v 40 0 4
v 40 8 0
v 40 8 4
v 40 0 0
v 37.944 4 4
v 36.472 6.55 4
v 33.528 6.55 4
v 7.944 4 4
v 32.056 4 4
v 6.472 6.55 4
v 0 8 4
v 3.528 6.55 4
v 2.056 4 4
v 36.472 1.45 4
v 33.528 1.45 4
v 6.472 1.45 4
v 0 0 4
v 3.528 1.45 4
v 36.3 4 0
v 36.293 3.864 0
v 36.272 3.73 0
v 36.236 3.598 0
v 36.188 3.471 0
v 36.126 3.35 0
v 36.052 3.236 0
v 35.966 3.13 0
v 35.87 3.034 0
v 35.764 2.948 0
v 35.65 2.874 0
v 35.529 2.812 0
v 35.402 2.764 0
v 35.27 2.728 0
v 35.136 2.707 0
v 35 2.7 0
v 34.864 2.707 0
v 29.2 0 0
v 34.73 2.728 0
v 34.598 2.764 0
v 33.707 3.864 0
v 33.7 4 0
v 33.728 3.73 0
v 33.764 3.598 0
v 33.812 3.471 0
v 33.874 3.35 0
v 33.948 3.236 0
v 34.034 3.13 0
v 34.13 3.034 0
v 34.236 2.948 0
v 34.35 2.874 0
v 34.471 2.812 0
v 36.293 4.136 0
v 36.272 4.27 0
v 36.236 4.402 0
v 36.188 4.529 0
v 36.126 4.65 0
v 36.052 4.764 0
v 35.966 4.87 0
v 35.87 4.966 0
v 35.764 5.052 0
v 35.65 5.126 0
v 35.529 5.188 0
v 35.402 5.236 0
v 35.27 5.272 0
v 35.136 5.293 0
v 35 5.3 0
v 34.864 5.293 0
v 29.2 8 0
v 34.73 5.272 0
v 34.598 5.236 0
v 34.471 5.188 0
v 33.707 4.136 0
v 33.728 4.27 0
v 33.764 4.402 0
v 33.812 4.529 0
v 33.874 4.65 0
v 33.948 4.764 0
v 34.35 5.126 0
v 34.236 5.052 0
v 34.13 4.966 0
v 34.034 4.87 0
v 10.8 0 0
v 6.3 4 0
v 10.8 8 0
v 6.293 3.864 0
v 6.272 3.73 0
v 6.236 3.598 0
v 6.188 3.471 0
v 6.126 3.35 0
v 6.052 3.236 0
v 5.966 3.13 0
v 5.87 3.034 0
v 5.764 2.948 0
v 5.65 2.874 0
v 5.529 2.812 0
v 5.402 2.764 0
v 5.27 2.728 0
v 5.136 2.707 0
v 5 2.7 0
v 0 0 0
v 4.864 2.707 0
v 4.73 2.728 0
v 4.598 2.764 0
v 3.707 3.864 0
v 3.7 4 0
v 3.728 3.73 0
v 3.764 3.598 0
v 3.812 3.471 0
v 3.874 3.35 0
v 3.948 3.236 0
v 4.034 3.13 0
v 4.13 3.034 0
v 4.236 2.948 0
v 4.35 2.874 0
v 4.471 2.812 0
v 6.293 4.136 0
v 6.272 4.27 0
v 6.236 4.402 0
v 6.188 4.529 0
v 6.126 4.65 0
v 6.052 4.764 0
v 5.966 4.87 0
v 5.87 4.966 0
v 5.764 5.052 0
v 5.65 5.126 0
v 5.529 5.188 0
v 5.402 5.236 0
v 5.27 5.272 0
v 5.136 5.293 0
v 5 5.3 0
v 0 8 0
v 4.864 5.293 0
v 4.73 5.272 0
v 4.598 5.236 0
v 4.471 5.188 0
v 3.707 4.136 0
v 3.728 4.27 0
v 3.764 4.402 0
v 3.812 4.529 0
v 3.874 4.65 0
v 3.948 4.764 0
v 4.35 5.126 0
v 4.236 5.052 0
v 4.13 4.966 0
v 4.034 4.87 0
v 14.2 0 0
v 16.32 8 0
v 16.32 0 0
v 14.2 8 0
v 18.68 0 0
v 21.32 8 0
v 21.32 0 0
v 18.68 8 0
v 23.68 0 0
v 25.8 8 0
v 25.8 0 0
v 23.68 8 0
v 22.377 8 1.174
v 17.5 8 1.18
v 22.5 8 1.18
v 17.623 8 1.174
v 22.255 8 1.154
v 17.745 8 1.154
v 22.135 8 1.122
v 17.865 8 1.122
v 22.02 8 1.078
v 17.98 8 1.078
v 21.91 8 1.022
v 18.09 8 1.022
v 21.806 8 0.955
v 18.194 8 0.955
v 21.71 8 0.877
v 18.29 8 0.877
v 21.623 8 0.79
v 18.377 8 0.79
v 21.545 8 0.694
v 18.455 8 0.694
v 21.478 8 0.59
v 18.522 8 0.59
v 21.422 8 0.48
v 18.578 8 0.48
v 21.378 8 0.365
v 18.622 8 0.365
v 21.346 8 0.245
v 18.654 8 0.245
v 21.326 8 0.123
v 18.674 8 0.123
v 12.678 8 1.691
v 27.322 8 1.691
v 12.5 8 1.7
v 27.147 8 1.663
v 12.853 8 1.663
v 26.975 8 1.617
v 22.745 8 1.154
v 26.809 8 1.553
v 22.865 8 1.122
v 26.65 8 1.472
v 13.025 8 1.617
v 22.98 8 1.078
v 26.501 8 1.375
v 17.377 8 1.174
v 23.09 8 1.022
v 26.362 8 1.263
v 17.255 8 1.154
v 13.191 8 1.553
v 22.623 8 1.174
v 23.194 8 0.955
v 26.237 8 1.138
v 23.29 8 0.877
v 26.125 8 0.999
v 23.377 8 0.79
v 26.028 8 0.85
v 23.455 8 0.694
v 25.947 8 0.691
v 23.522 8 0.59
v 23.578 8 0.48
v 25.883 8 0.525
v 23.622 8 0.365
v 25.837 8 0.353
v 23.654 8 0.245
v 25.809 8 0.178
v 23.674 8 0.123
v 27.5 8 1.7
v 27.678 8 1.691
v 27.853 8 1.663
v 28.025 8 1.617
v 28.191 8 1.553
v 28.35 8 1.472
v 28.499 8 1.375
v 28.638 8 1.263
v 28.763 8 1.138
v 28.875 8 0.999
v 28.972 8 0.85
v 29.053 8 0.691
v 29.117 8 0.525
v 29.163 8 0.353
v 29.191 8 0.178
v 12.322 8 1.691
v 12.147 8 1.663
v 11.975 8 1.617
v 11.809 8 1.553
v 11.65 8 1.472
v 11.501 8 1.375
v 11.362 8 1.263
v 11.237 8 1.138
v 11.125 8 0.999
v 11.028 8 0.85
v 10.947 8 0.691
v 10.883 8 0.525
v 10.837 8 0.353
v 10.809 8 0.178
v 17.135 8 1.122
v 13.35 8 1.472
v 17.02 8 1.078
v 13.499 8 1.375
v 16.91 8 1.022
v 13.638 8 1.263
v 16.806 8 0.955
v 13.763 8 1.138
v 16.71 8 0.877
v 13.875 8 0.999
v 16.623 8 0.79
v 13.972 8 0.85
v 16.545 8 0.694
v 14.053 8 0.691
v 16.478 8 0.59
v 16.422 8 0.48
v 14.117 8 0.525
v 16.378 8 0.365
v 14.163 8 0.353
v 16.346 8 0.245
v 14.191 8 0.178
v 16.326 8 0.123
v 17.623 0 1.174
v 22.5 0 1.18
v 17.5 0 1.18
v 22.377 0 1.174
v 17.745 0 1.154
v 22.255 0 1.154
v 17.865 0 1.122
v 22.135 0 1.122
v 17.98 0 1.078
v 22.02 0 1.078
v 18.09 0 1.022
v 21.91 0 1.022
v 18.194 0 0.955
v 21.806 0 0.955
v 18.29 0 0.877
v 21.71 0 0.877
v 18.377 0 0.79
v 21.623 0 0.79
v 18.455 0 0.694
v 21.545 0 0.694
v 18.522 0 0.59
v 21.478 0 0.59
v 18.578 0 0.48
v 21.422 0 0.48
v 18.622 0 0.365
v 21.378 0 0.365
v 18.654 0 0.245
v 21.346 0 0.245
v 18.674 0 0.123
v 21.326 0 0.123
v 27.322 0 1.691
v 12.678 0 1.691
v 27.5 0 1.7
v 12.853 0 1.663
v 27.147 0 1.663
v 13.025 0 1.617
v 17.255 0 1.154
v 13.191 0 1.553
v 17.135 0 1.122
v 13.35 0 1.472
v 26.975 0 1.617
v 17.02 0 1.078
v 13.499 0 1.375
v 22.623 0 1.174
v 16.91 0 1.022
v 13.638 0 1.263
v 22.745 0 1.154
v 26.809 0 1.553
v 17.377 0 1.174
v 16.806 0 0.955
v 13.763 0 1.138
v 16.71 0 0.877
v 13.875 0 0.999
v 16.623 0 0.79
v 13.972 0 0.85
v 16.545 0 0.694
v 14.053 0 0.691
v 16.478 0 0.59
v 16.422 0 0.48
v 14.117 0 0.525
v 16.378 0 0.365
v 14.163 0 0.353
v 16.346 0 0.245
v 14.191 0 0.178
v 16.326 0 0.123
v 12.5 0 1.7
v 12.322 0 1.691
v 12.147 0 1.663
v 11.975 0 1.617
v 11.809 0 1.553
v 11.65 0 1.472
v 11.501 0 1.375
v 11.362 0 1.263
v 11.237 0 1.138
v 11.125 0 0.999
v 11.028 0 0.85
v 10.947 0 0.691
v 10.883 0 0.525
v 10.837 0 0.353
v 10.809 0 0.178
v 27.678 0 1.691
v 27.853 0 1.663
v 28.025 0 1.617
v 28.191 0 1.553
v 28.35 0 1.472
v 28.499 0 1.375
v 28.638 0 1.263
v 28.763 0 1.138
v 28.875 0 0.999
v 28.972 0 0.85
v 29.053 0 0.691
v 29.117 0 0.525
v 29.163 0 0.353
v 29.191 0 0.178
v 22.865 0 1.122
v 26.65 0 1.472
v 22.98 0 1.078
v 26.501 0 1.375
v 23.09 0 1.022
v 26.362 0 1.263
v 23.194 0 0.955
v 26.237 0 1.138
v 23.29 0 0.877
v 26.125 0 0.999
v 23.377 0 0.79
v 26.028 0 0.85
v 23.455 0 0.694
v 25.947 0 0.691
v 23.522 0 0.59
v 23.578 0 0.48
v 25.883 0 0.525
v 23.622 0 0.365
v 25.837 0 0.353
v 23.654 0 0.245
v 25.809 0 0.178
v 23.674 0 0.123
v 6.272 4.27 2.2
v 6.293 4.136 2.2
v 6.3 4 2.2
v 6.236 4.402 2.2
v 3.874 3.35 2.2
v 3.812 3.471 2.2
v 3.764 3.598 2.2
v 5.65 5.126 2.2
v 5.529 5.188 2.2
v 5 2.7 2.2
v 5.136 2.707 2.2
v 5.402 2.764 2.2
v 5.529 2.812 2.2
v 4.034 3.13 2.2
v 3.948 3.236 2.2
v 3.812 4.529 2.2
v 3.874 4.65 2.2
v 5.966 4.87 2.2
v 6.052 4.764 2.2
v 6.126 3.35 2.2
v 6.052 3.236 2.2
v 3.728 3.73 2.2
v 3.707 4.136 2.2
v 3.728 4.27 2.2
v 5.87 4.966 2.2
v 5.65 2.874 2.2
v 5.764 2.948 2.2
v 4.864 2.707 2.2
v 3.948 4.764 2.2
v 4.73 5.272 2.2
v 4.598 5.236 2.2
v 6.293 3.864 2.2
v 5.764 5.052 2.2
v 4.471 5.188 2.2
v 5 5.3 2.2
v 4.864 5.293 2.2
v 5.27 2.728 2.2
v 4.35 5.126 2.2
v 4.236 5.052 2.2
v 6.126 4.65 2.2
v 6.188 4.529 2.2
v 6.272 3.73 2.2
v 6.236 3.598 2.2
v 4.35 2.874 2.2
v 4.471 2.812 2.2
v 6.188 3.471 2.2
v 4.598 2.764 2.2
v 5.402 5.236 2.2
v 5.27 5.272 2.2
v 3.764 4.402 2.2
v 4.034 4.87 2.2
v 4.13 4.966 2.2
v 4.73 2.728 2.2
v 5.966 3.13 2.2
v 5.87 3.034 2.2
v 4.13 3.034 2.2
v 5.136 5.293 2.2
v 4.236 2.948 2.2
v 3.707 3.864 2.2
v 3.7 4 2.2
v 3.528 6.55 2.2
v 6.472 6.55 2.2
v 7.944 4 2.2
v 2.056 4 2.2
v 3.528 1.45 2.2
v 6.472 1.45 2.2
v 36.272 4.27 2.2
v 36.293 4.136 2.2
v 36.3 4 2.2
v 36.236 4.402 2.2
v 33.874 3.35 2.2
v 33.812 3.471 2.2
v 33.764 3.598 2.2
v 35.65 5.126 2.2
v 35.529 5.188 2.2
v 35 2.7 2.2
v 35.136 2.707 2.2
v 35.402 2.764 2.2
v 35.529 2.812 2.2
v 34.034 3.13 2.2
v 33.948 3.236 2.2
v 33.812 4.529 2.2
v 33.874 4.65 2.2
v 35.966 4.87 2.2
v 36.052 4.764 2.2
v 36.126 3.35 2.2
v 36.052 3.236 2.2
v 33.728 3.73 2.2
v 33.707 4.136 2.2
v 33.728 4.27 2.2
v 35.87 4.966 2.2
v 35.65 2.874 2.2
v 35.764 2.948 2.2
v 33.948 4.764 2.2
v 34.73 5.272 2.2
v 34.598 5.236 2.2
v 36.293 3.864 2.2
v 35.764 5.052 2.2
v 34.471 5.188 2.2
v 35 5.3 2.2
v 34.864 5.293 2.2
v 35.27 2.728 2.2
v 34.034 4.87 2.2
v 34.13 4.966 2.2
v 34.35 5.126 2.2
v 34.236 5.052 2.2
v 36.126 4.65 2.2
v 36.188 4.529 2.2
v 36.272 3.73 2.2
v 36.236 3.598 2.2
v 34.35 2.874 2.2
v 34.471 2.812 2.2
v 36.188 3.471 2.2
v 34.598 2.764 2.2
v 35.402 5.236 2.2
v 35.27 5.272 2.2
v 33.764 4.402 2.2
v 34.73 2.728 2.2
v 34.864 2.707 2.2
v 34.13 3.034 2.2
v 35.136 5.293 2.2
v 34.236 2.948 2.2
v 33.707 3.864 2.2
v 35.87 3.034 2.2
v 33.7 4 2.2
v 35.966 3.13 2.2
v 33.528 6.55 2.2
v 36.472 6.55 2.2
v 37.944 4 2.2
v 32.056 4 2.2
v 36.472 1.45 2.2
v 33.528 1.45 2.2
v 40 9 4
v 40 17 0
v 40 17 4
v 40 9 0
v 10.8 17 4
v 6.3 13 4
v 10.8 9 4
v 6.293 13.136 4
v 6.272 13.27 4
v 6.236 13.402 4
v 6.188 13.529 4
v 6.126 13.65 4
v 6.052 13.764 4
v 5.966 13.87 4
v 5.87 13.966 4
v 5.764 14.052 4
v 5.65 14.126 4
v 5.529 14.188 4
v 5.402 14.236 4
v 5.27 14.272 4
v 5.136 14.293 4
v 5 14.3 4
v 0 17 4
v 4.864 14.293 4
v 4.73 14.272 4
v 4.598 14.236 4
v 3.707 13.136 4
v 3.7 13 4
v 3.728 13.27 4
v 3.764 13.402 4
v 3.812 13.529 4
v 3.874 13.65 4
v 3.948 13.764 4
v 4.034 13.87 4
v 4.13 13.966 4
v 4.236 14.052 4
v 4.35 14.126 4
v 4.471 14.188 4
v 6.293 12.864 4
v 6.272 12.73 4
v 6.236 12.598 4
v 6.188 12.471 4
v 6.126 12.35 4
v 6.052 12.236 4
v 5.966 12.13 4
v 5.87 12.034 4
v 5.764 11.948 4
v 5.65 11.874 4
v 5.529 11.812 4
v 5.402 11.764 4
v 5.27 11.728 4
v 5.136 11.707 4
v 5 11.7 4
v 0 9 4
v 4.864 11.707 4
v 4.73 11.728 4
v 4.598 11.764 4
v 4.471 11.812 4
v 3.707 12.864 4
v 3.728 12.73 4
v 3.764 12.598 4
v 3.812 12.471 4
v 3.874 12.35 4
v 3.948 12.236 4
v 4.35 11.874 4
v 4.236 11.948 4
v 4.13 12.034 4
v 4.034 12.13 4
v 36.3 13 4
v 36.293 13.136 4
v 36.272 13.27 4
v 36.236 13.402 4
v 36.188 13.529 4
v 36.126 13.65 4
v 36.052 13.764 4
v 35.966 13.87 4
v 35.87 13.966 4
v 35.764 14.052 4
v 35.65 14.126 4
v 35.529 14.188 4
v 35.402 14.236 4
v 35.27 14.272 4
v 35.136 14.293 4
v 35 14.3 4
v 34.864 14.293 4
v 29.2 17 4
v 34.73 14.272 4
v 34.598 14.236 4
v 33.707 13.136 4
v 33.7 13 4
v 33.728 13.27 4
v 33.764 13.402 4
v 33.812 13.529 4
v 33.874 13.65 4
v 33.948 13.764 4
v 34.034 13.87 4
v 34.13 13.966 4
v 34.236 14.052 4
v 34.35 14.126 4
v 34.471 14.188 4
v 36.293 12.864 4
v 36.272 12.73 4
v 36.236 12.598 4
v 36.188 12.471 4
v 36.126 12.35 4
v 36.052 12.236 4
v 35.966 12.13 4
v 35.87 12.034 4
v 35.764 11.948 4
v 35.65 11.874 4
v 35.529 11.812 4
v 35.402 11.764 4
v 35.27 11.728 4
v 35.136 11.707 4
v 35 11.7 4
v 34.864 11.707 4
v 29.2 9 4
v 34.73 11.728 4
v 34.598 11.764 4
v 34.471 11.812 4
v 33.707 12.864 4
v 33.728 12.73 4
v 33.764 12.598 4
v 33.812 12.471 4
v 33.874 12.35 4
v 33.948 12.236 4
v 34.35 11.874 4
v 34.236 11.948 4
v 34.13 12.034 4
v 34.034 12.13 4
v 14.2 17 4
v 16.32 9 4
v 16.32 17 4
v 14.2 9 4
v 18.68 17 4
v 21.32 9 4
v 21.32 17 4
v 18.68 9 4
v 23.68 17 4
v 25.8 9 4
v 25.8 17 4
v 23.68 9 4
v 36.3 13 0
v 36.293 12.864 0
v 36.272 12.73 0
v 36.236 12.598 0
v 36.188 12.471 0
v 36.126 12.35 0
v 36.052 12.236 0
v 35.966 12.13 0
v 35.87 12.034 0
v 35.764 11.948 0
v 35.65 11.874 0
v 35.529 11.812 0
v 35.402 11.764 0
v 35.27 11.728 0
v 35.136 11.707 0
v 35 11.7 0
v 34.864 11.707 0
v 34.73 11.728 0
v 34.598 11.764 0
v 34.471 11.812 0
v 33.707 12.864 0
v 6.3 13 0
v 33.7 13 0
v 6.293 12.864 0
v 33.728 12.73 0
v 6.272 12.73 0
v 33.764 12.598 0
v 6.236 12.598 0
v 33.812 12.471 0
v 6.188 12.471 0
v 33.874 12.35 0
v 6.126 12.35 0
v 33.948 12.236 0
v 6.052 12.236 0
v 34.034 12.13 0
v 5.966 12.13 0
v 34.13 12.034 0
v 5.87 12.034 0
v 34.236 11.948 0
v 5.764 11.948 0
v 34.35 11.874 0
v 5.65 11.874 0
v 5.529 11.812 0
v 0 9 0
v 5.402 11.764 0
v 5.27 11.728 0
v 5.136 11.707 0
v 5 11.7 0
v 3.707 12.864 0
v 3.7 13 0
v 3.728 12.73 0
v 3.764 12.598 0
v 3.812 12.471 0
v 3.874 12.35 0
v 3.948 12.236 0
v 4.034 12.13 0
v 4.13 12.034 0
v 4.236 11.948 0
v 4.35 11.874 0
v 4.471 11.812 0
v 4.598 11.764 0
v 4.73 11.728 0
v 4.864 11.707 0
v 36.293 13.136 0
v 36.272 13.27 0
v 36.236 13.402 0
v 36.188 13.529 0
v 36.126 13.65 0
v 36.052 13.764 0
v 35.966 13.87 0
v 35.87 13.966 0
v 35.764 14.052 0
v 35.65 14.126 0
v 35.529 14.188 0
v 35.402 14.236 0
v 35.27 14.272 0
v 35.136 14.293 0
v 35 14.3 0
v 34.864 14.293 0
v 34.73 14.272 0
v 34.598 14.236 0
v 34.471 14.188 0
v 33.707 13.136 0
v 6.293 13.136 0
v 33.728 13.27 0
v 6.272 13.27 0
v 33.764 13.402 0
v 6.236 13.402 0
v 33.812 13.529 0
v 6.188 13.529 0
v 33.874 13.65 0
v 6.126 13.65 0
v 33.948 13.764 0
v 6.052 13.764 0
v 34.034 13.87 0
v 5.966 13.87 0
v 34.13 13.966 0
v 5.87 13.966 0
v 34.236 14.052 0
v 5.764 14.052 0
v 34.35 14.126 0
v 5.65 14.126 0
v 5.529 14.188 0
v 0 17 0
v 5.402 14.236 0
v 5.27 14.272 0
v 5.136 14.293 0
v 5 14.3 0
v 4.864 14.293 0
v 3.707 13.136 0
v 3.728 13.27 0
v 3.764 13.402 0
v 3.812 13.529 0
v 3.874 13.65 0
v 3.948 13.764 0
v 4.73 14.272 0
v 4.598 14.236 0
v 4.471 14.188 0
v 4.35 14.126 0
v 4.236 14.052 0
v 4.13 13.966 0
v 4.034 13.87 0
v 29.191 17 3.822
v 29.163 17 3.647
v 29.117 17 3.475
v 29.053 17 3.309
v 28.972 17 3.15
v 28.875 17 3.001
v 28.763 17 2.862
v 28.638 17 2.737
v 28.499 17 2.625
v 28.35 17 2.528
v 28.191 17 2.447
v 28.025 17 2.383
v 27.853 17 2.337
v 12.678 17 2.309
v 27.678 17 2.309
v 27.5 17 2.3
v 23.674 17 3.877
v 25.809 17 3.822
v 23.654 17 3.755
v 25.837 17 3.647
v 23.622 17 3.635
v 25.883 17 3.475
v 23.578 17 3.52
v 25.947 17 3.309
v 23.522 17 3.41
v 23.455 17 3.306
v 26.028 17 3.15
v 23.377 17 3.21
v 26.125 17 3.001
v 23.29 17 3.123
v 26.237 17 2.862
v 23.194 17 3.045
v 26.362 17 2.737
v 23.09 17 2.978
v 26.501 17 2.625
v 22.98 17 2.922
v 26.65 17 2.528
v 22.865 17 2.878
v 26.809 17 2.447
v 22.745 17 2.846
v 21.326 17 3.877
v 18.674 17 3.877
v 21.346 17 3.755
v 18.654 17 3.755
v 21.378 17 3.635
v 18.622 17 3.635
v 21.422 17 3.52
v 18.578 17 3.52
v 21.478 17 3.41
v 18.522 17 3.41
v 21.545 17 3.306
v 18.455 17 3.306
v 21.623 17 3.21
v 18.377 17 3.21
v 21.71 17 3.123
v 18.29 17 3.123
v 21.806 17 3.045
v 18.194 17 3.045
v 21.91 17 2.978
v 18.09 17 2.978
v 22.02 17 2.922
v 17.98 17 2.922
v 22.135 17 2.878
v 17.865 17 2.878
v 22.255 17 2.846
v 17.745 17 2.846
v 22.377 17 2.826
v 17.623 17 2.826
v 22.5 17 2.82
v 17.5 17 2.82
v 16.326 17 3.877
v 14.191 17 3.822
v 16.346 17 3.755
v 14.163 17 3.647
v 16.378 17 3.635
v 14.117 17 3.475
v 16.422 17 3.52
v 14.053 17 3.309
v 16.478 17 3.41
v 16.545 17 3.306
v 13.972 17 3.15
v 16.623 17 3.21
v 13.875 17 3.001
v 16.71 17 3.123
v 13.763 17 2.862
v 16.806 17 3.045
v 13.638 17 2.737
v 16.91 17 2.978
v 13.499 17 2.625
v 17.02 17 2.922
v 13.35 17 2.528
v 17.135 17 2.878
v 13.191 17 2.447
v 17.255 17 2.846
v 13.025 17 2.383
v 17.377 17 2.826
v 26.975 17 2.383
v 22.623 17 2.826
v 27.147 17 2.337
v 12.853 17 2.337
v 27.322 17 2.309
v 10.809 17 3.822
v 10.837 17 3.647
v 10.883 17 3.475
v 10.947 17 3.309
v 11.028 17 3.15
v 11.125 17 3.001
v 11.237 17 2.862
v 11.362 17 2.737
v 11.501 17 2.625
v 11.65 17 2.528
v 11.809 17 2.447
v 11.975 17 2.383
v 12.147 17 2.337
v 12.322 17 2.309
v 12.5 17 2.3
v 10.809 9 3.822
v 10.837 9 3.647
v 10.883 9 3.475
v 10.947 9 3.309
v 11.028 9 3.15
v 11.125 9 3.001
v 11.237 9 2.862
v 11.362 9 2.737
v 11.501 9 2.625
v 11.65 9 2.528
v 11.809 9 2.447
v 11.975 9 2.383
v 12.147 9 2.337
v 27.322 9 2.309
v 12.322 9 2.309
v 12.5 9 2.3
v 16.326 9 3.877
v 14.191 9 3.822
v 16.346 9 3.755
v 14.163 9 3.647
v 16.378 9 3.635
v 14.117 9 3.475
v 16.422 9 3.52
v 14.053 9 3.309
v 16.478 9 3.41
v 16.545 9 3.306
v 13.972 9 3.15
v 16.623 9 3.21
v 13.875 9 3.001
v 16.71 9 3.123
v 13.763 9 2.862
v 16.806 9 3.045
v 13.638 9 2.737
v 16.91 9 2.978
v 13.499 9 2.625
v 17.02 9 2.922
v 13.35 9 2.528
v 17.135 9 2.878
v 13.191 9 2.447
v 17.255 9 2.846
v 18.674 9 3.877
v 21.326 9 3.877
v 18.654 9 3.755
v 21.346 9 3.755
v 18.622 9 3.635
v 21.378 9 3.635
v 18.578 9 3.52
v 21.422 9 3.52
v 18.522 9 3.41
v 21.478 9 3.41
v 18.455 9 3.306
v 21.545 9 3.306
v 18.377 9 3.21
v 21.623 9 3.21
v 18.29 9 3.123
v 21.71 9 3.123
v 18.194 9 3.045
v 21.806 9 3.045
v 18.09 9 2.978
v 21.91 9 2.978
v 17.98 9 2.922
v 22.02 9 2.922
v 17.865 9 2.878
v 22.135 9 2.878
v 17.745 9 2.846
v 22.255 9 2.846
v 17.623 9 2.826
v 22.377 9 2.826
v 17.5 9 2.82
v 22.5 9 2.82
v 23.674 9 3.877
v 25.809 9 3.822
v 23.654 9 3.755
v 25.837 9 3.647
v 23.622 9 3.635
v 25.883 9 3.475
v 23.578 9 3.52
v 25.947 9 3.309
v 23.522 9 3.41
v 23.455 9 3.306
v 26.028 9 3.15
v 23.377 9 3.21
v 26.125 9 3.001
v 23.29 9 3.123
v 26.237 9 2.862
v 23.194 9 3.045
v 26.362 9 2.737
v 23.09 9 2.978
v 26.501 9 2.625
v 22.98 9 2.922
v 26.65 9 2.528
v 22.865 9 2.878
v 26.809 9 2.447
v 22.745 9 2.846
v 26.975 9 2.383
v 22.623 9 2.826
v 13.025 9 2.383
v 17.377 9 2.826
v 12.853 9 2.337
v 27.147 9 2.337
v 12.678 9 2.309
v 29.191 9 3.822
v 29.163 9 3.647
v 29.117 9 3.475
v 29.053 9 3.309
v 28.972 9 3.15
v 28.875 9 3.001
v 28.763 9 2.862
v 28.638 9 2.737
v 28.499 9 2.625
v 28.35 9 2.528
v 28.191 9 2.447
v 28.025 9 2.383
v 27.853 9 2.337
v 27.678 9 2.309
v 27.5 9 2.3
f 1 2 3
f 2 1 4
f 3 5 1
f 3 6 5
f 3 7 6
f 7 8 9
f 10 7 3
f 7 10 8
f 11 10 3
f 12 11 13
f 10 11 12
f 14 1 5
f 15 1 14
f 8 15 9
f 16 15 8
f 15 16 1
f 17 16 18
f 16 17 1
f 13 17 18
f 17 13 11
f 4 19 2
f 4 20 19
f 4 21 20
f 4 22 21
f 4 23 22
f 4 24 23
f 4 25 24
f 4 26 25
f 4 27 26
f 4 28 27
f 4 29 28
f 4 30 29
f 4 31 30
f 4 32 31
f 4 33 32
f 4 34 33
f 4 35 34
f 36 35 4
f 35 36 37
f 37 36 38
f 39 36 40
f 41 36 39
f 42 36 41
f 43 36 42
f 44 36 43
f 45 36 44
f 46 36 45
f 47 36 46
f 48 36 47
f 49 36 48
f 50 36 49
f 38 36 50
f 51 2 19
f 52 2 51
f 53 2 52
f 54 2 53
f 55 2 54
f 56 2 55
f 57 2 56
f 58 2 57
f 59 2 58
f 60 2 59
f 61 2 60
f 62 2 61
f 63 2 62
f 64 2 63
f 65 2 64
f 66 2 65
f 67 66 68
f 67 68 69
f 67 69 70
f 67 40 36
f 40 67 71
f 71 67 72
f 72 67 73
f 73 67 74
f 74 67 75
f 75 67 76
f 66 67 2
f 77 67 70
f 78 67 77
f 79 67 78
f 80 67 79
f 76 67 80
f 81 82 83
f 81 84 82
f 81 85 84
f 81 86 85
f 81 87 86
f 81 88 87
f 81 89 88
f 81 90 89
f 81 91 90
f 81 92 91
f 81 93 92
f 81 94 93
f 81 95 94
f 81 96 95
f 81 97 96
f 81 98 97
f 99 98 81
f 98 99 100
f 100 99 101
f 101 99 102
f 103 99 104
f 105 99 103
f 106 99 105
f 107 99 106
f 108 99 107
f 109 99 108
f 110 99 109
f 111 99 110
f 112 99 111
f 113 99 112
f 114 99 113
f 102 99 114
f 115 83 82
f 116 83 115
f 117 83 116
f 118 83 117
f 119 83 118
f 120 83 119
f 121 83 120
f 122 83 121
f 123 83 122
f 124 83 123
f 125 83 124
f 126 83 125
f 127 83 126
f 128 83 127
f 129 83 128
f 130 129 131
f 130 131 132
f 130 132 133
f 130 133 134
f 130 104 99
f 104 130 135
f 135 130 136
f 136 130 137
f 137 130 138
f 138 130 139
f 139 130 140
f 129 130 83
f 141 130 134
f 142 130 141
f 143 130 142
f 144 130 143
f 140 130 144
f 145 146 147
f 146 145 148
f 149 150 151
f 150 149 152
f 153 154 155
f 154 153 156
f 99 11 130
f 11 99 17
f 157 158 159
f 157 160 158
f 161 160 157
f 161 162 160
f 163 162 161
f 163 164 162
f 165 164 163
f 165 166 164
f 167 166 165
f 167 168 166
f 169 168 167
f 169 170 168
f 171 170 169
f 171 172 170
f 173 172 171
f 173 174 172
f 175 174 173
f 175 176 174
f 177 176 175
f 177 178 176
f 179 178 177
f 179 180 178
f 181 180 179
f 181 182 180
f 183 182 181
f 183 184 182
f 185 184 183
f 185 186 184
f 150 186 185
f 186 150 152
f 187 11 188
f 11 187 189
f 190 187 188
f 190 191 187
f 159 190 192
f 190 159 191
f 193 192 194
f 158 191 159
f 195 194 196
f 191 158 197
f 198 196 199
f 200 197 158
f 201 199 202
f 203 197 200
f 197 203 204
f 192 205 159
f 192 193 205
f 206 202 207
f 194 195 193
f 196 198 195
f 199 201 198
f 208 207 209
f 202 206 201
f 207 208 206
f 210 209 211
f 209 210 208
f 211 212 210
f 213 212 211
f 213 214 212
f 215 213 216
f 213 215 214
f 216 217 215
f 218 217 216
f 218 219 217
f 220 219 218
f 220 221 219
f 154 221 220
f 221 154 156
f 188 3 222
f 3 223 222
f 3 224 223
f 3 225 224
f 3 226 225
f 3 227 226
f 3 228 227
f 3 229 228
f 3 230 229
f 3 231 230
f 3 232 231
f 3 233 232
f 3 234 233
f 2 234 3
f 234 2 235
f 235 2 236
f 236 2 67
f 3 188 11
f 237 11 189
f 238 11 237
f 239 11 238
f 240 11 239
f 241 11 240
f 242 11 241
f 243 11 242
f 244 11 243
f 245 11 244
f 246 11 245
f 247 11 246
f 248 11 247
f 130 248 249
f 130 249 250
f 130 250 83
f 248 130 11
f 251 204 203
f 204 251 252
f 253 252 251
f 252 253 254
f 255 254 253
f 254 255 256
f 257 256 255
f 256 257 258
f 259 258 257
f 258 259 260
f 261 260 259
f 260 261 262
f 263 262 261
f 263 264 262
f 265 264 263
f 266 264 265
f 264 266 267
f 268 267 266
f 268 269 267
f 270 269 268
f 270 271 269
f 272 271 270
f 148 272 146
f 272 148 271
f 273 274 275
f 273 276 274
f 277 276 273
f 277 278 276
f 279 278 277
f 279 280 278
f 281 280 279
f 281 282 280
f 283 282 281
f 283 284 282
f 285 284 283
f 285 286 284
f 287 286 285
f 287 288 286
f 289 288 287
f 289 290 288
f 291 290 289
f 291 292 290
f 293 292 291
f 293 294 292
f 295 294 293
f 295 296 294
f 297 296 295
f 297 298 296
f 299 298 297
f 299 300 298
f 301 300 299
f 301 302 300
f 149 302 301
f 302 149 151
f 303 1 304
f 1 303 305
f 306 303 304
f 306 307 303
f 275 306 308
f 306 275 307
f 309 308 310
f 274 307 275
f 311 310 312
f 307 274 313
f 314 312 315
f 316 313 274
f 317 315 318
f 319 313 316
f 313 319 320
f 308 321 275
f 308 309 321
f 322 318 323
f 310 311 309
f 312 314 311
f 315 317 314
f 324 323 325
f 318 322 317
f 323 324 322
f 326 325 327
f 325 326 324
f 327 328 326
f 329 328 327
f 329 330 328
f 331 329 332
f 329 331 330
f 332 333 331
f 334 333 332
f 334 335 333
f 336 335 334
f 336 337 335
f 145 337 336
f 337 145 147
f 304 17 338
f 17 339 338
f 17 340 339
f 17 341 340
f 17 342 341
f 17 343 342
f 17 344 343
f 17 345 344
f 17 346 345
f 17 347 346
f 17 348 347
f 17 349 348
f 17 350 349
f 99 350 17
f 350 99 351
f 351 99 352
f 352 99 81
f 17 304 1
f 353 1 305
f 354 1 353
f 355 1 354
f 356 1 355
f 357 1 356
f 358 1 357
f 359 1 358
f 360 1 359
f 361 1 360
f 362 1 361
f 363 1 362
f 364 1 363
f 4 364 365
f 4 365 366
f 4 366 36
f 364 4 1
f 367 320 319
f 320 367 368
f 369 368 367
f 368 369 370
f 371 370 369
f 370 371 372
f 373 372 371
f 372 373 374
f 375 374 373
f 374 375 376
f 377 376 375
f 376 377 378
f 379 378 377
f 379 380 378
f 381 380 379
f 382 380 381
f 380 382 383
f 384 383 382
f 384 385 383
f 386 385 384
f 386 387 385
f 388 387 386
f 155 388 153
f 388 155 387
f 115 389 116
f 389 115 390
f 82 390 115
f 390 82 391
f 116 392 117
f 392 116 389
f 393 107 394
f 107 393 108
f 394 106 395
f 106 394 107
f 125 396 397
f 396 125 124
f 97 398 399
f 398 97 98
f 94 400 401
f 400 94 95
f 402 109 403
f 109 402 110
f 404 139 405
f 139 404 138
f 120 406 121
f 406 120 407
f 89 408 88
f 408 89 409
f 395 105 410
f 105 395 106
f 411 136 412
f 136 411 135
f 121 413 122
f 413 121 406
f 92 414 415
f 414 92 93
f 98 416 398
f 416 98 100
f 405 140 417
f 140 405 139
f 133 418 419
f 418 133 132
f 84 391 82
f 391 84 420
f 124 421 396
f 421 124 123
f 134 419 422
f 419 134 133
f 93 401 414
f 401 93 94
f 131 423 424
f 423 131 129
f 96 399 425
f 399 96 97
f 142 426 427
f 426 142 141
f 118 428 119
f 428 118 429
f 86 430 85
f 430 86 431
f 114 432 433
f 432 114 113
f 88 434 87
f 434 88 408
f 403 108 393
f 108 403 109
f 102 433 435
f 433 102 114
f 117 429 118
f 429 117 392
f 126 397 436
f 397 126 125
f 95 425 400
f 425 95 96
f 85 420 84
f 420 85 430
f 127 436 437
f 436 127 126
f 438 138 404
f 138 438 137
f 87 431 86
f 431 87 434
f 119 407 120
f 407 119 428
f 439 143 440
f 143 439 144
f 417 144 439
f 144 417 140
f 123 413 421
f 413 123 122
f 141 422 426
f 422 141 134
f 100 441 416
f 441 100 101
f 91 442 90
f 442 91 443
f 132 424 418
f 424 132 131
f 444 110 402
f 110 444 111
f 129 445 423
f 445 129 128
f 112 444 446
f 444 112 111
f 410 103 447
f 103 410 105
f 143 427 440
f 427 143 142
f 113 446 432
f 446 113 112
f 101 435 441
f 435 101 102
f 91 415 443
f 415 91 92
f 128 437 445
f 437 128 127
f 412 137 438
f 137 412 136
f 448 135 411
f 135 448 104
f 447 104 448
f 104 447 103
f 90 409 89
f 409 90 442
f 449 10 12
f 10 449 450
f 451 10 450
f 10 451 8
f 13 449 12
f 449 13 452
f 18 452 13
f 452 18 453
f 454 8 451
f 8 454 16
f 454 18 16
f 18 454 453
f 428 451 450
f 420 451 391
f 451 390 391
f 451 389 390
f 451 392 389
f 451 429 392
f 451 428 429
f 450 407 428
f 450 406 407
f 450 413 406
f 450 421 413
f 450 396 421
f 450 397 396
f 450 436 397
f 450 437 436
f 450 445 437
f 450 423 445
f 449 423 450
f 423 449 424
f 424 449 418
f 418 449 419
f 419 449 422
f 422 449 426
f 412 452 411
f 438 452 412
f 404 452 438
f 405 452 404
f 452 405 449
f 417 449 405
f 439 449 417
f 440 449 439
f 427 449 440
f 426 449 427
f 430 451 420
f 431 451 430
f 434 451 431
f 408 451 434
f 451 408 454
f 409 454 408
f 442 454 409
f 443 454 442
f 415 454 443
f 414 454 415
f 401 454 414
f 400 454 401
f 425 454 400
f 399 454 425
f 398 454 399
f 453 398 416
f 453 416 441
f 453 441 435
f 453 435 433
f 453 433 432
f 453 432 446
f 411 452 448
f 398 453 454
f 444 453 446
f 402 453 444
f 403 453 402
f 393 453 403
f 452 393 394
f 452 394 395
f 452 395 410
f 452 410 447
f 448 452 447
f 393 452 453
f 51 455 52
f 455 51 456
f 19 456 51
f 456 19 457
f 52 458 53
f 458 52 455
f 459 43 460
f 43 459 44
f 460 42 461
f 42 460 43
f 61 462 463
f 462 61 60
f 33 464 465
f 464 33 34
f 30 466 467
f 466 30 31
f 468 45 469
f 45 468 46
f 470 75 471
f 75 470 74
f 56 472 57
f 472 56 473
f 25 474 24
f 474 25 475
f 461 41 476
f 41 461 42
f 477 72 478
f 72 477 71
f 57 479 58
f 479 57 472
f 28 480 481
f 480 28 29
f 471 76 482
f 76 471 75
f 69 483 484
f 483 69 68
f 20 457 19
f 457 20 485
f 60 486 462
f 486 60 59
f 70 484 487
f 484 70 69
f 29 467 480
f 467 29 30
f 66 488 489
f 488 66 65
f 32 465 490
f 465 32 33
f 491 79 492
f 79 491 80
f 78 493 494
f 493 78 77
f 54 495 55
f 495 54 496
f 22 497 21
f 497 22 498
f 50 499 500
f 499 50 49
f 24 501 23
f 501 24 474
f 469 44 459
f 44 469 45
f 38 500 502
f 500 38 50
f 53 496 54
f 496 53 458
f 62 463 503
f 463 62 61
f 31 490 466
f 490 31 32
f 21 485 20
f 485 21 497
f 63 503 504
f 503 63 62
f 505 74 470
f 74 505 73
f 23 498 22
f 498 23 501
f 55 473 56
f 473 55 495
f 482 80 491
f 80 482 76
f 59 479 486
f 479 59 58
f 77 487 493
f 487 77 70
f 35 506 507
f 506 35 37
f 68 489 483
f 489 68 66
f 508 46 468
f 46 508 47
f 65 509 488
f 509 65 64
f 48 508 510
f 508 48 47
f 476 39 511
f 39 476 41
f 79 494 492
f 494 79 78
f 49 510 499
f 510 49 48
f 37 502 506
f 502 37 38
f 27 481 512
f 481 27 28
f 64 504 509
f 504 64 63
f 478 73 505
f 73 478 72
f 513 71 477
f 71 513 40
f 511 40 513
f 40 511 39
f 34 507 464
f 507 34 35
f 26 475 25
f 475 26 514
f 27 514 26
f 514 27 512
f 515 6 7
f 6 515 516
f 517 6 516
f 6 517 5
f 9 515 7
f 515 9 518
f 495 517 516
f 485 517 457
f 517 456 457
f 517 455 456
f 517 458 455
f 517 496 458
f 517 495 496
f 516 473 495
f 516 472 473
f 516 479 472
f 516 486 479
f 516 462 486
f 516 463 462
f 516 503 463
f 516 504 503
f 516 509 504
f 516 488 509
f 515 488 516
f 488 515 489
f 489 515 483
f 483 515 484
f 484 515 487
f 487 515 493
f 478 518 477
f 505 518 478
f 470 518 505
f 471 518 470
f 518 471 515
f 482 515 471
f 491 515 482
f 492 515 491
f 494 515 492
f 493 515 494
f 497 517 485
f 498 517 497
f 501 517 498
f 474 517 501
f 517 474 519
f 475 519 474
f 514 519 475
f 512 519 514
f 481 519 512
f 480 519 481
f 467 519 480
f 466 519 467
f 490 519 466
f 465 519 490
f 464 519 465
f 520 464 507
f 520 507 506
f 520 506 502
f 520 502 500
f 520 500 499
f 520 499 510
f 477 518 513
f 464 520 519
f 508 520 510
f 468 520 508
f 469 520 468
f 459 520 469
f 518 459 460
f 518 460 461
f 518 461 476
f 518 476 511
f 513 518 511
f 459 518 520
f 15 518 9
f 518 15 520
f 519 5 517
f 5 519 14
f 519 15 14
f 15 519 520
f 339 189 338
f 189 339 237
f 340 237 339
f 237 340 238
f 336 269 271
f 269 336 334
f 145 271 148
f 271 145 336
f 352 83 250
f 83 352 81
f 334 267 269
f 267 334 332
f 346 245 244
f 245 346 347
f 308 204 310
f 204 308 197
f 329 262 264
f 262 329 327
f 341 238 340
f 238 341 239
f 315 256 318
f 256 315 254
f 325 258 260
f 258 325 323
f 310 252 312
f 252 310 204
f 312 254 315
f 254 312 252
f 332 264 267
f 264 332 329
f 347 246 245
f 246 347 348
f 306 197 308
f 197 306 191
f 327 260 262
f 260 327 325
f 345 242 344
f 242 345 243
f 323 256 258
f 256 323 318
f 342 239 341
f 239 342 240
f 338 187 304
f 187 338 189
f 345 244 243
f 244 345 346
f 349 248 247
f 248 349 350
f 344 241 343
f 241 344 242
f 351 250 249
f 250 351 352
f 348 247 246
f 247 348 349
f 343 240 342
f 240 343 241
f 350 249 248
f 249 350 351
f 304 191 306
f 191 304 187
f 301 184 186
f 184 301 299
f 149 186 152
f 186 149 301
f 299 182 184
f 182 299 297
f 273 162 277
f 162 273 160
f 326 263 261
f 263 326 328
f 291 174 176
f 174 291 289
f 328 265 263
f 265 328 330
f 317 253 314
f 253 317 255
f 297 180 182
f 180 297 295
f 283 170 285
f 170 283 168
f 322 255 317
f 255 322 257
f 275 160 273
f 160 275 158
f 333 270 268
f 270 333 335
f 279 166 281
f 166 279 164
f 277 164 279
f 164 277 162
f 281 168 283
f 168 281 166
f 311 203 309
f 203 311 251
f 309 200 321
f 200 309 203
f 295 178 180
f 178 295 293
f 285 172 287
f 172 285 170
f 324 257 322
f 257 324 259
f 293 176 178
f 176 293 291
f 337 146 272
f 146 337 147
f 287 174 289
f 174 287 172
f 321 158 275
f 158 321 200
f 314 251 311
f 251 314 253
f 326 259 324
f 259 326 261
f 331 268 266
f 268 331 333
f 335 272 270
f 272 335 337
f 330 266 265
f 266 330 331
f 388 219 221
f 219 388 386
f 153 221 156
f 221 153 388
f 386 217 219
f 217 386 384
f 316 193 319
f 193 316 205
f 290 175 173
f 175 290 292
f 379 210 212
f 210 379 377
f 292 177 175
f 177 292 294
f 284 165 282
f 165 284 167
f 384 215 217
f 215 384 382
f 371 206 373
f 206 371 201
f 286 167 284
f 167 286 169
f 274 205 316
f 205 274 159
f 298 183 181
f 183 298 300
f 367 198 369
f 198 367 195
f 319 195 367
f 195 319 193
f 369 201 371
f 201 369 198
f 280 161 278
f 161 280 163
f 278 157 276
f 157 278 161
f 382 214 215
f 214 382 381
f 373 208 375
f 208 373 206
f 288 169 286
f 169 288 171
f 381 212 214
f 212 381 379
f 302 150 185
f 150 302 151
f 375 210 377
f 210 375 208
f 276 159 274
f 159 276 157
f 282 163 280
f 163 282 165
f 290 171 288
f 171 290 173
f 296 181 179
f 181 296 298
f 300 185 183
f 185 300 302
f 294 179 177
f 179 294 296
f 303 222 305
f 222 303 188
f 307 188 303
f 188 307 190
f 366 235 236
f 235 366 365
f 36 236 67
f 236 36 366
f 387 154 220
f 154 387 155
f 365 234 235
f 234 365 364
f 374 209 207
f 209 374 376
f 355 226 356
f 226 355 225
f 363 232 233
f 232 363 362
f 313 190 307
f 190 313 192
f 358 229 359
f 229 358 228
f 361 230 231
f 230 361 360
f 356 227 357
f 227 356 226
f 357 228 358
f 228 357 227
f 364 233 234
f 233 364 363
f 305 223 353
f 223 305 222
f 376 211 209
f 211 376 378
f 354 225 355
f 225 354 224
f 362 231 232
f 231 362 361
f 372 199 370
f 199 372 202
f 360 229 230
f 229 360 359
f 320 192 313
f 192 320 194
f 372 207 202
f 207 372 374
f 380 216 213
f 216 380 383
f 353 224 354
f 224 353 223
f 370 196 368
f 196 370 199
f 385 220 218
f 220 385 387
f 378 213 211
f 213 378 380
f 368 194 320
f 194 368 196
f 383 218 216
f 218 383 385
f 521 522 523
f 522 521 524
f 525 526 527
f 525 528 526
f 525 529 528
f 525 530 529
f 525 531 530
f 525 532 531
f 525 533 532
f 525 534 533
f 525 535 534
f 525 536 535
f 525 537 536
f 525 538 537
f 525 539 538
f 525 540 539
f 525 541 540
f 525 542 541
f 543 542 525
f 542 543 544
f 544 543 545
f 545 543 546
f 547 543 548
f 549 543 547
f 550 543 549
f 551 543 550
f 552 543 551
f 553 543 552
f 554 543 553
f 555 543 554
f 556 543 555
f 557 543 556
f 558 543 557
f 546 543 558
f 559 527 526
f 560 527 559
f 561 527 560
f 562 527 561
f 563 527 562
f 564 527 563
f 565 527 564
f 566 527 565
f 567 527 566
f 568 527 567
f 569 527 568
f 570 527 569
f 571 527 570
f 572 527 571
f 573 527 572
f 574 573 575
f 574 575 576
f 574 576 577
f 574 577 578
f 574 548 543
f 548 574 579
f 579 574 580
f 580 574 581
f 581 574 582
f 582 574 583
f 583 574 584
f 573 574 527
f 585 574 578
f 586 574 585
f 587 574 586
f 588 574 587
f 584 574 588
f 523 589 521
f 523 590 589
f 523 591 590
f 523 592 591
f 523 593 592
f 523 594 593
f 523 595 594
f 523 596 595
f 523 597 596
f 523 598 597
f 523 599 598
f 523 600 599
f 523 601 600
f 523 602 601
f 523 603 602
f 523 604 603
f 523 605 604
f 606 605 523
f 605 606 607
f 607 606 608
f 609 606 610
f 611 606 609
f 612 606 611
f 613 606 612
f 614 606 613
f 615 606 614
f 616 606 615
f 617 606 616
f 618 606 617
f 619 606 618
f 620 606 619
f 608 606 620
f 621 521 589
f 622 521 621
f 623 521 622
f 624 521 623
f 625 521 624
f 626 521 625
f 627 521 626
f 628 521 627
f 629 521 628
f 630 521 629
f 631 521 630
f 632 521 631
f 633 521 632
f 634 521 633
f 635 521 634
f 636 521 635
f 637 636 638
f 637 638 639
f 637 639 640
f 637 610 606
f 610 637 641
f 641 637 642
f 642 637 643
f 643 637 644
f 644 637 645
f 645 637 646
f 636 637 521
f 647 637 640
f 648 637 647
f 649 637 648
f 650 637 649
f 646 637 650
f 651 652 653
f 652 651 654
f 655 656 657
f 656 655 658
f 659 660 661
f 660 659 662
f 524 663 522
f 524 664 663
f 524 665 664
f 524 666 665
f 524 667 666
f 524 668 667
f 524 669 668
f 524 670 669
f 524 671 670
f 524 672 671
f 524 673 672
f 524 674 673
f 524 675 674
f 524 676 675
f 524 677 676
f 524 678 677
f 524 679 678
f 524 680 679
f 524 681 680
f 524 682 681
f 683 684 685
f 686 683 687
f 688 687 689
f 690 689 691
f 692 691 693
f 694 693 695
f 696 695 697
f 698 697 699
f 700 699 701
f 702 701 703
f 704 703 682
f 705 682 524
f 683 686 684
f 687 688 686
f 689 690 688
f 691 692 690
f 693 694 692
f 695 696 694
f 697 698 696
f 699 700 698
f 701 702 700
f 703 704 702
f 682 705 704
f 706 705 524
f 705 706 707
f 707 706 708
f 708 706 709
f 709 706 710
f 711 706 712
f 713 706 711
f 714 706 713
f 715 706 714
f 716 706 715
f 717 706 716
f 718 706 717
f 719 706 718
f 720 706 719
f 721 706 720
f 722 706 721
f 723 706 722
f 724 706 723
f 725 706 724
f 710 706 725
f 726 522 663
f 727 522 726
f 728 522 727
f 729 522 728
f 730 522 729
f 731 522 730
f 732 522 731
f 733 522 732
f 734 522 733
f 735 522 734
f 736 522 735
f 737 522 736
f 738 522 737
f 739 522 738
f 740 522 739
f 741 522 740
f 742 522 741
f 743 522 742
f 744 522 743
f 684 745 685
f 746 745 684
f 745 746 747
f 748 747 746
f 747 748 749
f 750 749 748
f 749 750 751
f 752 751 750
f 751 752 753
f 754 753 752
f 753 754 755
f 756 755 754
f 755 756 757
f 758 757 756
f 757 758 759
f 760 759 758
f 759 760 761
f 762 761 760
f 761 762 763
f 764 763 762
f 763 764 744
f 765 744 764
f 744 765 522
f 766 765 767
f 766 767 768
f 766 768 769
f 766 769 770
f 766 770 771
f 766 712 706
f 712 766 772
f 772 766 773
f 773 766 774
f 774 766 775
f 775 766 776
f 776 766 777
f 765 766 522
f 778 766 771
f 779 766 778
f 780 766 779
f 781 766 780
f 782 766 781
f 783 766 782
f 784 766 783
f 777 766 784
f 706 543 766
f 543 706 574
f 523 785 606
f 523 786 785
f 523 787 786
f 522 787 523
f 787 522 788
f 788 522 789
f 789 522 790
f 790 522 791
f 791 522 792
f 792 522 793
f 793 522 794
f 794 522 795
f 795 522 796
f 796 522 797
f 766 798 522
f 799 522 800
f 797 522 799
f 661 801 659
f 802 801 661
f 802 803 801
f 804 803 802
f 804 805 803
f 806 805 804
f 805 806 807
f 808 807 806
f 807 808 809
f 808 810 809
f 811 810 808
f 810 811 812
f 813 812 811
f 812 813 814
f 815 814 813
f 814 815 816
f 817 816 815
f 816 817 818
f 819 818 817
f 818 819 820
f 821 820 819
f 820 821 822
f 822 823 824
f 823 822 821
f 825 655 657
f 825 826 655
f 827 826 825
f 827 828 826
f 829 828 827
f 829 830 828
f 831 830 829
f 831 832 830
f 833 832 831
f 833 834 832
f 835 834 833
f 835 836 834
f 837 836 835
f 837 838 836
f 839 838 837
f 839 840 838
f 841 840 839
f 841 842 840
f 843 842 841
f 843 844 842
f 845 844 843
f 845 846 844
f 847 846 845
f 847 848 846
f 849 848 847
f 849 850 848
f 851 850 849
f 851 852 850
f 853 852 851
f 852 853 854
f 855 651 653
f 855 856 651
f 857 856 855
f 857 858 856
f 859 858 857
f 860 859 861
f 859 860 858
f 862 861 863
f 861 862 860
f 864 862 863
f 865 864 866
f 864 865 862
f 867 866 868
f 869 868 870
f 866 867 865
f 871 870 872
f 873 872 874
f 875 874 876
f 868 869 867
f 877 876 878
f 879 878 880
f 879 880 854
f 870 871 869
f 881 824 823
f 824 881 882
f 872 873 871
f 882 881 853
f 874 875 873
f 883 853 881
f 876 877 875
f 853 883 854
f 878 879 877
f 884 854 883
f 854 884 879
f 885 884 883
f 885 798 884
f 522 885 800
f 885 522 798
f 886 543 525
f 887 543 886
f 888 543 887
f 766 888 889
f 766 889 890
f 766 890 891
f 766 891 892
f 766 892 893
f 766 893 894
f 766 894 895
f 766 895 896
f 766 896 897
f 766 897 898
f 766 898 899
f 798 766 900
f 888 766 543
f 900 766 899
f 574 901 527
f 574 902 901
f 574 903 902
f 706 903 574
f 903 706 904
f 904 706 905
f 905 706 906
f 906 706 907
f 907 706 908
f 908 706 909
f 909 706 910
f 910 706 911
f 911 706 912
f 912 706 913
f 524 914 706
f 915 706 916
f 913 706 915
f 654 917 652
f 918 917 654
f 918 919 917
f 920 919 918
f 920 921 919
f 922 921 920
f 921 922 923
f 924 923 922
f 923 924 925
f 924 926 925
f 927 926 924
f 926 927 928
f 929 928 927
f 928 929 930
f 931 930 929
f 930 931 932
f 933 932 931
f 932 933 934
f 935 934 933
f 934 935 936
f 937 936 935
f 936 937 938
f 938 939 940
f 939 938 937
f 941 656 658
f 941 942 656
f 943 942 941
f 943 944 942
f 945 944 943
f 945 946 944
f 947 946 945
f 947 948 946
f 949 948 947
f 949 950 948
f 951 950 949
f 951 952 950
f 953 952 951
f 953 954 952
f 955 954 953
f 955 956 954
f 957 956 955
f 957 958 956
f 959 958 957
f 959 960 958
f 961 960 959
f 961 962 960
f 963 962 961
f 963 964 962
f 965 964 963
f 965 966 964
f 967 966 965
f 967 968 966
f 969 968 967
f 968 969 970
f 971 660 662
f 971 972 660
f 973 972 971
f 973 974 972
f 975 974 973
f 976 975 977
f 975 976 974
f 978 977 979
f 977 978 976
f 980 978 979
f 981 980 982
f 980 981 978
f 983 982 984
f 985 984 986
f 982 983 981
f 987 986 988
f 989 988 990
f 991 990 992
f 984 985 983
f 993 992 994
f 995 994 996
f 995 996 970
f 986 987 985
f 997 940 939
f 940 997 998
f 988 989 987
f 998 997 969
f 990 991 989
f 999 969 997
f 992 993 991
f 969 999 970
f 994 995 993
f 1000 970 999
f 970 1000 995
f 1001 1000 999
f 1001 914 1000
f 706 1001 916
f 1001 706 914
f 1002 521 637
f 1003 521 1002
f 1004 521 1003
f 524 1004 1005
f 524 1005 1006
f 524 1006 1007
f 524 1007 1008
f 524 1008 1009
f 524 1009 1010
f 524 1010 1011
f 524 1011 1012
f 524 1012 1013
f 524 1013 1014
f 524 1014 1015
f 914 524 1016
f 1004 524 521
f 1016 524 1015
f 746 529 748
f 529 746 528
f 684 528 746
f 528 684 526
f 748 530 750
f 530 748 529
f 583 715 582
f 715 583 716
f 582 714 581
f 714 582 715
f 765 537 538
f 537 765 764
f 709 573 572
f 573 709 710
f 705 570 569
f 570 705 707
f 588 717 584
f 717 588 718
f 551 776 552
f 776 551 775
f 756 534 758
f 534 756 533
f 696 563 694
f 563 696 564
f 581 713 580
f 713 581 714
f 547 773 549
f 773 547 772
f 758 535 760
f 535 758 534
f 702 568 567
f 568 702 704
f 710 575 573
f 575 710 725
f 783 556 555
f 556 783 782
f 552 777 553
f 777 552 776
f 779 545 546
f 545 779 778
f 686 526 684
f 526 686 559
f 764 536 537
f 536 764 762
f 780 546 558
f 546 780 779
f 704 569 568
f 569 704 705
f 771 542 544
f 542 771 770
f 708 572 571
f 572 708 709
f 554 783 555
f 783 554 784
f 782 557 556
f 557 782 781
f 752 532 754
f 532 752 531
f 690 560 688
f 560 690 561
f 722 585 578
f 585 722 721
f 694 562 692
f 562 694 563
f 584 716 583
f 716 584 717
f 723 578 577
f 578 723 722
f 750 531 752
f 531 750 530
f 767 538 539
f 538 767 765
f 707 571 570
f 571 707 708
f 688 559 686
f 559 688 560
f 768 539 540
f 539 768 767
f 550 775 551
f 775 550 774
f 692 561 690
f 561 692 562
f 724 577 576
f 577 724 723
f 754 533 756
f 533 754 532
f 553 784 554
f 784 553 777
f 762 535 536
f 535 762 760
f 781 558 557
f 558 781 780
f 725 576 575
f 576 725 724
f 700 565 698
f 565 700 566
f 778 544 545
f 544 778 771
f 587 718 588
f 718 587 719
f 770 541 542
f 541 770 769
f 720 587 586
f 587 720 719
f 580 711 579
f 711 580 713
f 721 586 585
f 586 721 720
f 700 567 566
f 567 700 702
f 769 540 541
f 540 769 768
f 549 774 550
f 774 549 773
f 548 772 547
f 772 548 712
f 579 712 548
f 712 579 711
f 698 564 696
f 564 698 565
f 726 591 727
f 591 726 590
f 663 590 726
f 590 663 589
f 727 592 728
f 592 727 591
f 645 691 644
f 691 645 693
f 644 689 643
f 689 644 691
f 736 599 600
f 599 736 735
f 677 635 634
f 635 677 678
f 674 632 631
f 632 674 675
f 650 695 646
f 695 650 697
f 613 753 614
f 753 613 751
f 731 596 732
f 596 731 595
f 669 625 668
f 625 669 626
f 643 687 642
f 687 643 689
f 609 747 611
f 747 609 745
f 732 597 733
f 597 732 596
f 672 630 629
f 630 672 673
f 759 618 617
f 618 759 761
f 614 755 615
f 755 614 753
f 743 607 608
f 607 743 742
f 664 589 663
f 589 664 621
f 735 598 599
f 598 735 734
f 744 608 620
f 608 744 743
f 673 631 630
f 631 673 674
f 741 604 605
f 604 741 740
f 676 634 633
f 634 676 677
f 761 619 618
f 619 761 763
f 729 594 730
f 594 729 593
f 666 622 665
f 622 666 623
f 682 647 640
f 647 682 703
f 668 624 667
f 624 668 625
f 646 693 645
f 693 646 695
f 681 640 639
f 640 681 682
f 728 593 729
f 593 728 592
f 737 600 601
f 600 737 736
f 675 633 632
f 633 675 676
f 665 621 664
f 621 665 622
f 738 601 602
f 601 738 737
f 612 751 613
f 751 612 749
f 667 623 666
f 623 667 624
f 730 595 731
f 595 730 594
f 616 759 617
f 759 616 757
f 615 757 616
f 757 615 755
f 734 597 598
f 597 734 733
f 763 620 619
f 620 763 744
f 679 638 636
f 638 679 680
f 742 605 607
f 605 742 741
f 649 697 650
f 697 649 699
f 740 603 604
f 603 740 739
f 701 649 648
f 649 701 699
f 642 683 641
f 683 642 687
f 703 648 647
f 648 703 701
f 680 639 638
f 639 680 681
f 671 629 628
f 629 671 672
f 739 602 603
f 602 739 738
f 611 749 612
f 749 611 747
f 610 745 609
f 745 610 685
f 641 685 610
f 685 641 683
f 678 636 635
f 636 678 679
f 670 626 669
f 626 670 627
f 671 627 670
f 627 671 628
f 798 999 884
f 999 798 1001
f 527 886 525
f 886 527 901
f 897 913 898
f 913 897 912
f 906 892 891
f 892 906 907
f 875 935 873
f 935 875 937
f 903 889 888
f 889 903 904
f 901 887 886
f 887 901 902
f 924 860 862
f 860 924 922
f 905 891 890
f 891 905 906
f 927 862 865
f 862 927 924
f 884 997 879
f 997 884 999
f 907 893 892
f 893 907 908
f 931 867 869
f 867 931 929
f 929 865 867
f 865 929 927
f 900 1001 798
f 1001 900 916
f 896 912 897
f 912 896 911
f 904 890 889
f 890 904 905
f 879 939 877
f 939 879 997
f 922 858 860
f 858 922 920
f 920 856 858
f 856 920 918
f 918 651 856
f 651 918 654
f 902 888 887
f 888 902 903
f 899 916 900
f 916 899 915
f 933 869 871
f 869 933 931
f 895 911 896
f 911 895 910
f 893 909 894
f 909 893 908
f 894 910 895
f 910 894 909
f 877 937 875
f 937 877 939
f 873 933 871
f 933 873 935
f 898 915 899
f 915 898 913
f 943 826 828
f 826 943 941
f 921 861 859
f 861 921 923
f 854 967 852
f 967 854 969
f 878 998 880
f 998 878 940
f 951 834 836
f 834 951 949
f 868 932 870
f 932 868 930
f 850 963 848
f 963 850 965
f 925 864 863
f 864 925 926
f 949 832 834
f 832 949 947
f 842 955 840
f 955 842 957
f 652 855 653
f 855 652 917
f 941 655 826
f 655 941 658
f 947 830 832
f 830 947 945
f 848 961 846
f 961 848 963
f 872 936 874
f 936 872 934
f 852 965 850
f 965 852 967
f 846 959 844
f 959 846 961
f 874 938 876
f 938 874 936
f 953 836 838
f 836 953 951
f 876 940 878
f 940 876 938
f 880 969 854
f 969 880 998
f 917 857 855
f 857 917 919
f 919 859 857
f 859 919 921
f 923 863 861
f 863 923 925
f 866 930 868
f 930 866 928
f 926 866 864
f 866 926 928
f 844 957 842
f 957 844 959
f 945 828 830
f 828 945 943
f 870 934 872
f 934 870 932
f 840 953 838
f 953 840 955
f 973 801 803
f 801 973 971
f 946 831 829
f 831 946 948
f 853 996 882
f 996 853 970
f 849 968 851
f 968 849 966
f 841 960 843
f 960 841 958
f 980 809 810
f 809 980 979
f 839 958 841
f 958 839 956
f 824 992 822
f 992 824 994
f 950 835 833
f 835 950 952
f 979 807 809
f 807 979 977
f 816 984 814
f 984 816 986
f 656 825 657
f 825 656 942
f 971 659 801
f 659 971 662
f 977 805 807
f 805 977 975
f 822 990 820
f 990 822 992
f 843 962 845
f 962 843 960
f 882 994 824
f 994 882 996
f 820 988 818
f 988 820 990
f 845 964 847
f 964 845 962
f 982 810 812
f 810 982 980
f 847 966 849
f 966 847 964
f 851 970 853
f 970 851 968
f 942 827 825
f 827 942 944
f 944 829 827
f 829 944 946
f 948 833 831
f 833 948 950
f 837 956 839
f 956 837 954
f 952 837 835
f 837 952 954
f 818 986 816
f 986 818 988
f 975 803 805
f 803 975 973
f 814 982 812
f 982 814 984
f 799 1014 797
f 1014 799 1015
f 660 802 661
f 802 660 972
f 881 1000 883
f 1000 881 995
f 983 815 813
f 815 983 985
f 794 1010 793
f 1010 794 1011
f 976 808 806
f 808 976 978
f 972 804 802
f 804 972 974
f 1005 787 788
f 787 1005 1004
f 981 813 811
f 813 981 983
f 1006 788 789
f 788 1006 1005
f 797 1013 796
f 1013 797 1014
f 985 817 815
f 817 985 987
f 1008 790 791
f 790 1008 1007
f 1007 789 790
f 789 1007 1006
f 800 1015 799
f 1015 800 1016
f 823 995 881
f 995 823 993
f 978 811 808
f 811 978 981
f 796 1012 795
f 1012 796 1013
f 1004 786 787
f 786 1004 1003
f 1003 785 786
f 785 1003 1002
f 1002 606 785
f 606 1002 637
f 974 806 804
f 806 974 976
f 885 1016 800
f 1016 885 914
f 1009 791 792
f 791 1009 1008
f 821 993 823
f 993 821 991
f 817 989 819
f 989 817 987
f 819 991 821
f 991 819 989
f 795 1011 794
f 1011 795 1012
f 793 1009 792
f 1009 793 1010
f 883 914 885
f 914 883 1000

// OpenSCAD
pitch=5;
hole1=3.4;
hole2=2.36;
hole3=2.36;
hole4=3.4;
holepositionx=10+pitch/2;
ruuvireika=2.6;
mutterisyvennys=5.1;
mutterithickness=1.8;

depth=8;
thickness=8;
width=pitch*4+20;
ruuvireika1x=5;
ruuvireika2x=width-5;

difference() {
  cube([width,depth,thickness/2]);
  translate([ruuvireika1x,depth/2,-0.01]) cylinder(h=thickness+1,d=ruuvireika,$fn=60);
  translate([ruuvireika1x+0,depth/2,thickness/2-mutterithickness]) cylinder(h=mutterithickness+1,d=mutterisyvennys/cos(180/6),$fn=6);
  translate([ruuvireika2x,depth/2,-0.01]) cylinder(h=thickness+1,d=ruuvireika,$fn=60);
  translate([ruuvireika2x+0,depth/2,thickness/2-mutterithickness]) cylinder(h=mutterithickness+1,d=mutterisyvennys/cos(180/6),$fn=6);
  rotate(a=[90,0,0]) translate([holepositionx+0*pitch,0,-depth-0.01]) cylinder(h=depth+1,d=hole1,$fn=60);
  rotate(a=[90,0,0]) translate([holepositionx+1*pitch,0,-depth-0.01]) cylinder(h=depth+1,d=hole2,$fn=60);
  rotate(a=[90,0,0]) translate([holepositionx+2*pitch,0,-depth-0.01]) cylinder(h=depth+1,d=hole2,$fn=60);
  rotate(a=[90,0,0]) translate([holepositionx+3*pitch,0,-depth-0.01]) cylinder(h=depth+1,d=hole1,$fn=60);
}

translate([0,depth+1,0]) difference() {
  cube([width,depth,thickness/2]);
  translate([ruuvireika1x,depth/2,-0.01]) cylinder(h=thickness+1,d=ruuvireika,$fn=60);
  translate([ruuvireika2x,depth/2,-0.01]) cylinder(h=thickness+1,d=ruuvireika,$fn=60);
  rotate(a=[90,0,0]) translate([holepositionx+0*pitch,thickness/2,-depth-0.01]) cylinder(h=depth+1,d=hole1,$fn=60);
  rotate(a=[90,0,0]) translate([holepositionx+1*pitch,thickness/2,-depth-0.01]) cylinder(h=depth+1,d=hole2,$fn=60);
  rotate(a=[90,0,0]) translate([holepositionx+2*pitch,thickness/2,-depth-0.01]) cylinder(h=depth+1,d=hole2,$fn=60);
  rotate(a=[90,0,0]) translate([holepositionx+3*pitch,thickness/2,-depth-0.01]) cylinder(h=depth+1,d=hole1,$fn=60);
}
